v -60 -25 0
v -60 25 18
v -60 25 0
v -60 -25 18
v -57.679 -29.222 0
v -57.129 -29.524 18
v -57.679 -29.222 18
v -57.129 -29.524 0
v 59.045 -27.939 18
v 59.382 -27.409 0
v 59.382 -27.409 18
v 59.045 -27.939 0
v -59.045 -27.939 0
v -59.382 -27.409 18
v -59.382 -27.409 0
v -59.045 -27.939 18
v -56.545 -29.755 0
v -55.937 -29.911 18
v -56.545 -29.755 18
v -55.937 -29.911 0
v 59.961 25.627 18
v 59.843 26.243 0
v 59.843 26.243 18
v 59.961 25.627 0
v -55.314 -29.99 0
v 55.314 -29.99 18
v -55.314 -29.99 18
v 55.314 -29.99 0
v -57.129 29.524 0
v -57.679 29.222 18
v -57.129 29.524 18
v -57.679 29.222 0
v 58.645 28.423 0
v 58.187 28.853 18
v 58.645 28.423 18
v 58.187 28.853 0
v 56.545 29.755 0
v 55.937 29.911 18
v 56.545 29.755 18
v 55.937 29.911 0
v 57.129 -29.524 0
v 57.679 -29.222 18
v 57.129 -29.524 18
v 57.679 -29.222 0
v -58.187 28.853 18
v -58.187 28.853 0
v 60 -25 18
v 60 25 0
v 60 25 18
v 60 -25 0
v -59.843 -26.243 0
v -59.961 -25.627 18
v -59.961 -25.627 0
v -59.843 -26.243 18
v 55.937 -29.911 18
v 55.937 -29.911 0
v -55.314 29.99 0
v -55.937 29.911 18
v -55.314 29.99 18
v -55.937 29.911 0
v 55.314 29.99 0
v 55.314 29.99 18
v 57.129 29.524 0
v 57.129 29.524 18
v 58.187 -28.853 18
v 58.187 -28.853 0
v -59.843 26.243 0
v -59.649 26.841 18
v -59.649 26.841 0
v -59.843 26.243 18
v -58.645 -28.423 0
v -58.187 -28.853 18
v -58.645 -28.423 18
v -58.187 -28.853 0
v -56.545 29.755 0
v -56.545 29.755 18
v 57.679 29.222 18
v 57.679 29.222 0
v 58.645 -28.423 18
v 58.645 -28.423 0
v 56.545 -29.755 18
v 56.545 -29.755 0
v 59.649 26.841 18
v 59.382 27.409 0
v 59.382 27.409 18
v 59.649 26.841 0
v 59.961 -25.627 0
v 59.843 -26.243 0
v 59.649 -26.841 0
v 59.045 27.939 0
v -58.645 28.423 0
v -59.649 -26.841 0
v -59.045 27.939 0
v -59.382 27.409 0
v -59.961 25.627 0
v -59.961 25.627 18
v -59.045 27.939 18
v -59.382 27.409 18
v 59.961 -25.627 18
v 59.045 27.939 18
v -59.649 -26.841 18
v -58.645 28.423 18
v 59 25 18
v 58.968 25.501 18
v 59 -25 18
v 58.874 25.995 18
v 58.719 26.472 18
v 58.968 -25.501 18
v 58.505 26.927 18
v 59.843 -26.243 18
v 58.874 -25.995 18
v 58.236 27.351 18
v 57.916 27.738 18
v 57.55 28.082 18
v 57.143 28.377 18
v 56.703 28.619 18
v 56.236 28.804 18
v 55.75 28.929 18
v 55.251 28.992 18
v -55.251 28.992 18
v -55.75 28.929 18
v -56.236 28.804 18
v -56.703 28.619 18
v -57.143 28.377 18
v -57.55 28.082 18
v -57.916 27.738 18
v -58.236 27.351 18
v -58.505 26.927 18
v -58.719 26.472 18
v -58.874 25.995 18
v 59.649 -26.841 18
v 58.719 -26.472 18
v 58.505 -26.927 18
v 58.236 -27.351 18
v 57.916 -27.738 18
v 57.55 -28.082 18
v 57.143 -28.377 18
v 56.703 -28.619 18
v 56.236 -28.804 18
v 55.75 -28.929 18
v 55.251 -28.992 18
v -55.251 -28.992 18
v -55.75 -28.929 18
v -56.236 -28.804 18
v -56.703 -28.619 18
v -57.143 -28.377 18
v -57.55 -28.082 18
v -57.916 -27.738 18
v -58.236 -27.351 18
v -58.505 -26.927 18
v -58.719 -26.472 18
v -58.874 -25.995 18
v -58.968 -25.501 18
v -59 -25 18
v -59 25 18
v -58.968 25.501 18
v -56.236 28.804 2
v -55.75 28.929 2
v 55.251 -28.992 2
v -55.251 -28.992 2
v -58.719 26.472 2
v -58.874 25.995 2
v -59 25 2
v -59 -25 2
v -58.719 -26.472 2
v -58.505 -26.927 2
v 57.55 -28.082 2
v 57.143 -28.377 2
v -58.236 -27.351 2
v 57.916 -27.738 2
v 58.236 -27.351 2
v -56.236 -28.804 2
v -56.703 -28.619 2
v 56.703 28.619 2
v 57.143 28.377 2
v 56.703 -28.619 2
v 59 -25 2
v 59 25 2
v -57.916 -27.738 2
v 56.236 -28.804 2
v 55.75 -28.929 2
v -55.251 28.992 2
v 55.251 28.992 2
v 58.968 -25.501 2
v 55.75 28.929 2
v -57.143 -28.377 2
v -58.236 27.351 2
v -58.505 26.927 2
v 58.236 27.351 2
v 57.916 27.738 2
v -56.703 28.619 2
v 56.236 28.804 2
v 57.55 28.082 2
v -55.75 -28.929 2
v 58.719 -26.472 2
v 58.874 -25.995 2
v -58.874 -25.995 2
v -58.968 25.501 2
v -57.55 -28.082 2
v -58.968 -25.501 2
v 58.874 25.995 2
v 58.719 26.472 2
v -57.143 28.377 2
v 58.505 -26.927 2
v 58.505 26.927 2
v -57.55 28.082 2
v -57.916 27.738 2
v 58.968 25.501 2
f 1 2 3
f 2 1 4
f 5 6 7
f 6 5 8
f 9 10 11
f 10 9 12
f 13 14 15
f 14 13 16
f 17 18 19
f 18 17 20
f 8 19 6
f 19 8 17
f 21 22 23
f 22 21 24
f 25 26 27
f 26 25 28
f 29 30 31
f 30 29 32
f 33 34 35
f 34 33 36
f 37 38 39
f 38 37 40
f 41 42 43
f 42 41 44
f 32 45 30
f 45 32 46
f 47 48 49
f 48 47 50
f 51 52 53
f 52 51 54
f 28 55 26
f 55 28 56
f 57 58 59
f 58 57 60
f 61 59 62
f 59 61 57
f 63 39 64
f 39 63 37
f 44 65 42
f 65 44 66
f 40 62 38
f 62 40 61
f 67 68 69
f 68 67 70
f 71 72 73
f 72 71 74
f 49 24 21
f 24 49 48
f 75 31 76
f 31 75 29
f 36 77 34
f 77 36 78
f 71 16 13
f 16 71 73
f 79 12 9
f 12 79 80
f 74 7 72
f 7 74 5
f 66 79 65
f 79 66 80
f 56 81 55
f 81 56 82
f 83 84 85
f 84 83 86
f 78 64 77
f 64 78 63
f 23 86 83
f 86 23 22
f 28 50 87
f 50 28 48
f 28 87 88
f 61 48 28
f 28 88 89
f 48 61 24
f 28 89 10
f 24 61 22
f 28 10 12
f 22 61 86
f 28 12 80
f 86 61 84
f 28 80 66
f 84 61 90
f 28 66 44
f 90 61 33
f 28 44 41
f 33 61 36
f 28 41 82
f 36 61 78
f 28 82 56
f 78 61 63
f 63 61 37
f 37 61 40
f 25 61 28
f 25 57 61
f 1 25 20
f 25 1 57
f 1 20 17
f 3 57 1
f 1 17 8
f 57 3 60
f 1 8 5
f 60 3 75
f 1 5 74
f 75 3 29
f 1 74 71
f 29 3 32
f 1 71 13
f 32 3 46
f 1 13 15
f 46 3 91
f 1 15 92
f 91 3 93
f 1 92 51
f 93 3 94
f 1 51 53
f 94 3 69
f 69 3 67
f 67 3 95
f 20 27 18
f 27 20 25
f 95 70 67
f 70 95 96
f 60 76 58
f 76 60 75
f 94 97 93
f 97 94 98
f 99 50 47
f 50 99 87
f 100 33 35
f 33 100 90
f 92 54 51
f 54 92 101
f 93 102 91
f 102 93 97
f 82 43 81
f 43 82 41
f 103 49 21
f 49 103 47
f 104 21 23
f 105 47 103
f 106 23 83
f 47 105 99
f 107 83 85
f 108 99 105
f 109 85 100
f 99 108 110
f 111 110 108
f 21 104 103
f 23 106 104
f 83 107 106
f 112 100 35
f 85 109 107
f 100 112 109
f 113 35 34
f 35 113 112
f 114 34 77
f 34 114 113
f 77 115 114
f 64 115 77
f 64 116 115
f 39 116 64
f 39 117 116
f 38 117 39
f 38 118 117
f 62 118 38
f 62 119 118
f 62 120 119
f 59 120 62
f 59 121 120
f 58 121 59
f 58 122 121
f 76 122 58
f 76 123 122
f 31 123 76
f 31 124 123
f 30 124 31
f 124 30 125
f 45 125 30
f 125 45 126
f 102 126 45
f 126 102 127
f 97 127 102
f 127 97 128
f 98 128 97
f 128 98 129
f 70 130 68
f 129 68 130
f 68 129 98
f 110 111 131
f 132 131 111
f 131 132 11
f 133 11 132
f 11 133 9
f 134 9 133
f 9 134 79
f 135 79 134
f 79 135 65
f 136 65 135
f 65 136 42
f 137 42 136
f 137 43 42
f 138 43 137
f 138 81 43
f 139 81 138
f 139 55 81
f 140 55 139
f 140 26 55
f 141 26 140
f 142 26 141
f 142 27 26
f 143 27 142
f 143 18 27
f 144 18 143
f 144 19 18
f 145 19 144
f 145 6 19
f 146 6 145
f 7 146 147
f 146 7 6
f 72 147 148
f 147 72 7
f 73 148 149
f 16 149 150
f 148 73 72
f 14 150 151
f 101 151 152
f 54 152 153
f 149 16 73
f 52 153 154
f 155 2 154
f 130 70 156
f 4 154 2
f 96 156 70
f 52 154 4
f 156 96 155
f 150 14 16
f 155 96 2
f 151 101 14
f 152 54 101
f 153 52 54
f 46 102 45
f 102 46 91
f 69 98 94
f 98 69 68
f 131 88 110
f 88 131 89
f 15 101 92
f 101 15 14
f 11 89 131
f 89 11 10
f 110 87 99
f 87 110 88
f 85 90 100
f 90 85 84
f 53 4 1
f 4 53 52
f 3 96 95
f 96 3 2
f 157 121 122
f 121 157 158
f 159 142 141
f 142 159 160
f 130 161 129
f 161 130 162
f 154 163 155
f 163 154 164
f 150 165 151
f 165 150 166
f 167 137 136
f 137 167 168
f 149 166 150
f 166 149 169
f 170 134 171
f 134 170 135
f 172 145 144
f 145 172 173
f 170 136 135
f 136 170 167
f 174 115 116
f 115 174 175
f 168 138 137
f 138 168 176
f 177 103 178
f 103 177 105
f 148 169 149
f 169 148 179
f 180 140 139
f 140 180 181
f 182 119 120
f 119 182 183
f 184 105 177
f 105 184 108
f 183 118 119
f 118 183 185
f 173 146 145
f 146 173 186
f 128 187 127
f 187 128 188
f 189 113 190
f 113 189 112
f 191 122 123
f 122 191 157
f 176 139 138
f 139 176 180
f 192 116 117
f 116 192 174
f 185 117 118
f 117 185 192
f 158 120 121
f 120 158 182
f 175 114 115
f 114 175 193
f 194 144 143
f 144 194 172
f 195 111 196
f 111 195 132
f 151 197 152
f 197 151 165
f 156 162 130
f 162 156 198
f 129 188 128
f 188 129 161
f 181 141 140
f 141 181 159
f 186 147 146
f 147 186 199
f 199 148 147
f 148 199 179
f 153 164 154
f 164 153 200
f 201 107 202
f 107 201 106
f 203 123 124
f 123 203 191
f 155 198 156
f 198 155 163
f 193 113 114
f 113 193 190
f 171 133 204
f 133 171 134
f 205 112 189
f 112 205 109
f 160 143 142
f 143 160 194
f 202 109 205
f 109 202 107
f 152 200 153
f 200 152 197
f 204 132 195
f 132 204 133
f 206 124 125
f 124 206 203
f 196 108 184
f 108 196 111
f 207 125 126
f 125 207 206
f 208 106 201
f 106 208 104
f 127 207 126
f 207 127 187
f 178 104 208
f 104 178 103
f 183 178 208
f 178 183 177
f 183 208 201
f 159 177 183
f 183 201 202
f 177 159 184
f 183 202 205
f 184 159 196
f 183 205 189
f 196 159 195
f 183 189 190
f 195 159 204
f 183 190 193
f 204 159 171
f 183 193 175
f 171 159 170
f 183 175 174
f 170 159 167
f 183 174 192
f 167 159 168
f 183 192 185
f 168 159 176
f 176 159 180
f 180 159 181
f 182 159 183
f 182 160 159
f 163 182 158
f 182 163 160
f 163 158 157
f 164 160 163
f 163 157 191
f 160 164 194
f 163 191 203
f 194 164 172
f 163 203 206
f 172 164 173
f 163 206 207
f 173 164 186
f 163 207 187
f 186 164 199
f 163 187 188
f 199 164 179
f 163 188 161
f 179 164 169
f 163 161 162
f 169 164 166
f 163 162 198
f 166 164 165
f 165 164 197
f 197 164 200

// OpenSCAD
$fn = 50;


difference() {
	union() {
		hull() {
			translate(v = [-55.0000000000, 25.0000000000, 0]) {
				cylinder(h = 18, r = 5);
			}
			translate(v = [55.0000000000, 25.0000000000, 0]) {
				cylinder(h = 18, r = 5);
			}
			translate(v = [-55.0000000000, -25.0000000000, 0]) {
				cylinder(h = 18, r = 5);
			}
			translate(v = [55.0000000000, -25.0000000000, 0]) {
				cylinder(h = 18, r = 5);
			}
		}
	}
	union() {
		translate(v = [0, 0, 2]) {
			hull() {
				translate(v = [-55.0000000000, 25.0000000000, 0]) {
					cylinder(h = 16, r = 4);
				}
				translate(v = [55.0000000000, 25.0000000000, 0]) {
					cylinder(h = 16, r = 4);
				}
				translate(v = [-55.0000000000, -25.0000000000, 0]) {
					cylinder(h = 16, r = 4);
				}
				translate(v = [55.0000000000, -25.0000000000, 0]) {
					cylinder(h = 16, r = 4);
				}
			}
		}
	}
}
